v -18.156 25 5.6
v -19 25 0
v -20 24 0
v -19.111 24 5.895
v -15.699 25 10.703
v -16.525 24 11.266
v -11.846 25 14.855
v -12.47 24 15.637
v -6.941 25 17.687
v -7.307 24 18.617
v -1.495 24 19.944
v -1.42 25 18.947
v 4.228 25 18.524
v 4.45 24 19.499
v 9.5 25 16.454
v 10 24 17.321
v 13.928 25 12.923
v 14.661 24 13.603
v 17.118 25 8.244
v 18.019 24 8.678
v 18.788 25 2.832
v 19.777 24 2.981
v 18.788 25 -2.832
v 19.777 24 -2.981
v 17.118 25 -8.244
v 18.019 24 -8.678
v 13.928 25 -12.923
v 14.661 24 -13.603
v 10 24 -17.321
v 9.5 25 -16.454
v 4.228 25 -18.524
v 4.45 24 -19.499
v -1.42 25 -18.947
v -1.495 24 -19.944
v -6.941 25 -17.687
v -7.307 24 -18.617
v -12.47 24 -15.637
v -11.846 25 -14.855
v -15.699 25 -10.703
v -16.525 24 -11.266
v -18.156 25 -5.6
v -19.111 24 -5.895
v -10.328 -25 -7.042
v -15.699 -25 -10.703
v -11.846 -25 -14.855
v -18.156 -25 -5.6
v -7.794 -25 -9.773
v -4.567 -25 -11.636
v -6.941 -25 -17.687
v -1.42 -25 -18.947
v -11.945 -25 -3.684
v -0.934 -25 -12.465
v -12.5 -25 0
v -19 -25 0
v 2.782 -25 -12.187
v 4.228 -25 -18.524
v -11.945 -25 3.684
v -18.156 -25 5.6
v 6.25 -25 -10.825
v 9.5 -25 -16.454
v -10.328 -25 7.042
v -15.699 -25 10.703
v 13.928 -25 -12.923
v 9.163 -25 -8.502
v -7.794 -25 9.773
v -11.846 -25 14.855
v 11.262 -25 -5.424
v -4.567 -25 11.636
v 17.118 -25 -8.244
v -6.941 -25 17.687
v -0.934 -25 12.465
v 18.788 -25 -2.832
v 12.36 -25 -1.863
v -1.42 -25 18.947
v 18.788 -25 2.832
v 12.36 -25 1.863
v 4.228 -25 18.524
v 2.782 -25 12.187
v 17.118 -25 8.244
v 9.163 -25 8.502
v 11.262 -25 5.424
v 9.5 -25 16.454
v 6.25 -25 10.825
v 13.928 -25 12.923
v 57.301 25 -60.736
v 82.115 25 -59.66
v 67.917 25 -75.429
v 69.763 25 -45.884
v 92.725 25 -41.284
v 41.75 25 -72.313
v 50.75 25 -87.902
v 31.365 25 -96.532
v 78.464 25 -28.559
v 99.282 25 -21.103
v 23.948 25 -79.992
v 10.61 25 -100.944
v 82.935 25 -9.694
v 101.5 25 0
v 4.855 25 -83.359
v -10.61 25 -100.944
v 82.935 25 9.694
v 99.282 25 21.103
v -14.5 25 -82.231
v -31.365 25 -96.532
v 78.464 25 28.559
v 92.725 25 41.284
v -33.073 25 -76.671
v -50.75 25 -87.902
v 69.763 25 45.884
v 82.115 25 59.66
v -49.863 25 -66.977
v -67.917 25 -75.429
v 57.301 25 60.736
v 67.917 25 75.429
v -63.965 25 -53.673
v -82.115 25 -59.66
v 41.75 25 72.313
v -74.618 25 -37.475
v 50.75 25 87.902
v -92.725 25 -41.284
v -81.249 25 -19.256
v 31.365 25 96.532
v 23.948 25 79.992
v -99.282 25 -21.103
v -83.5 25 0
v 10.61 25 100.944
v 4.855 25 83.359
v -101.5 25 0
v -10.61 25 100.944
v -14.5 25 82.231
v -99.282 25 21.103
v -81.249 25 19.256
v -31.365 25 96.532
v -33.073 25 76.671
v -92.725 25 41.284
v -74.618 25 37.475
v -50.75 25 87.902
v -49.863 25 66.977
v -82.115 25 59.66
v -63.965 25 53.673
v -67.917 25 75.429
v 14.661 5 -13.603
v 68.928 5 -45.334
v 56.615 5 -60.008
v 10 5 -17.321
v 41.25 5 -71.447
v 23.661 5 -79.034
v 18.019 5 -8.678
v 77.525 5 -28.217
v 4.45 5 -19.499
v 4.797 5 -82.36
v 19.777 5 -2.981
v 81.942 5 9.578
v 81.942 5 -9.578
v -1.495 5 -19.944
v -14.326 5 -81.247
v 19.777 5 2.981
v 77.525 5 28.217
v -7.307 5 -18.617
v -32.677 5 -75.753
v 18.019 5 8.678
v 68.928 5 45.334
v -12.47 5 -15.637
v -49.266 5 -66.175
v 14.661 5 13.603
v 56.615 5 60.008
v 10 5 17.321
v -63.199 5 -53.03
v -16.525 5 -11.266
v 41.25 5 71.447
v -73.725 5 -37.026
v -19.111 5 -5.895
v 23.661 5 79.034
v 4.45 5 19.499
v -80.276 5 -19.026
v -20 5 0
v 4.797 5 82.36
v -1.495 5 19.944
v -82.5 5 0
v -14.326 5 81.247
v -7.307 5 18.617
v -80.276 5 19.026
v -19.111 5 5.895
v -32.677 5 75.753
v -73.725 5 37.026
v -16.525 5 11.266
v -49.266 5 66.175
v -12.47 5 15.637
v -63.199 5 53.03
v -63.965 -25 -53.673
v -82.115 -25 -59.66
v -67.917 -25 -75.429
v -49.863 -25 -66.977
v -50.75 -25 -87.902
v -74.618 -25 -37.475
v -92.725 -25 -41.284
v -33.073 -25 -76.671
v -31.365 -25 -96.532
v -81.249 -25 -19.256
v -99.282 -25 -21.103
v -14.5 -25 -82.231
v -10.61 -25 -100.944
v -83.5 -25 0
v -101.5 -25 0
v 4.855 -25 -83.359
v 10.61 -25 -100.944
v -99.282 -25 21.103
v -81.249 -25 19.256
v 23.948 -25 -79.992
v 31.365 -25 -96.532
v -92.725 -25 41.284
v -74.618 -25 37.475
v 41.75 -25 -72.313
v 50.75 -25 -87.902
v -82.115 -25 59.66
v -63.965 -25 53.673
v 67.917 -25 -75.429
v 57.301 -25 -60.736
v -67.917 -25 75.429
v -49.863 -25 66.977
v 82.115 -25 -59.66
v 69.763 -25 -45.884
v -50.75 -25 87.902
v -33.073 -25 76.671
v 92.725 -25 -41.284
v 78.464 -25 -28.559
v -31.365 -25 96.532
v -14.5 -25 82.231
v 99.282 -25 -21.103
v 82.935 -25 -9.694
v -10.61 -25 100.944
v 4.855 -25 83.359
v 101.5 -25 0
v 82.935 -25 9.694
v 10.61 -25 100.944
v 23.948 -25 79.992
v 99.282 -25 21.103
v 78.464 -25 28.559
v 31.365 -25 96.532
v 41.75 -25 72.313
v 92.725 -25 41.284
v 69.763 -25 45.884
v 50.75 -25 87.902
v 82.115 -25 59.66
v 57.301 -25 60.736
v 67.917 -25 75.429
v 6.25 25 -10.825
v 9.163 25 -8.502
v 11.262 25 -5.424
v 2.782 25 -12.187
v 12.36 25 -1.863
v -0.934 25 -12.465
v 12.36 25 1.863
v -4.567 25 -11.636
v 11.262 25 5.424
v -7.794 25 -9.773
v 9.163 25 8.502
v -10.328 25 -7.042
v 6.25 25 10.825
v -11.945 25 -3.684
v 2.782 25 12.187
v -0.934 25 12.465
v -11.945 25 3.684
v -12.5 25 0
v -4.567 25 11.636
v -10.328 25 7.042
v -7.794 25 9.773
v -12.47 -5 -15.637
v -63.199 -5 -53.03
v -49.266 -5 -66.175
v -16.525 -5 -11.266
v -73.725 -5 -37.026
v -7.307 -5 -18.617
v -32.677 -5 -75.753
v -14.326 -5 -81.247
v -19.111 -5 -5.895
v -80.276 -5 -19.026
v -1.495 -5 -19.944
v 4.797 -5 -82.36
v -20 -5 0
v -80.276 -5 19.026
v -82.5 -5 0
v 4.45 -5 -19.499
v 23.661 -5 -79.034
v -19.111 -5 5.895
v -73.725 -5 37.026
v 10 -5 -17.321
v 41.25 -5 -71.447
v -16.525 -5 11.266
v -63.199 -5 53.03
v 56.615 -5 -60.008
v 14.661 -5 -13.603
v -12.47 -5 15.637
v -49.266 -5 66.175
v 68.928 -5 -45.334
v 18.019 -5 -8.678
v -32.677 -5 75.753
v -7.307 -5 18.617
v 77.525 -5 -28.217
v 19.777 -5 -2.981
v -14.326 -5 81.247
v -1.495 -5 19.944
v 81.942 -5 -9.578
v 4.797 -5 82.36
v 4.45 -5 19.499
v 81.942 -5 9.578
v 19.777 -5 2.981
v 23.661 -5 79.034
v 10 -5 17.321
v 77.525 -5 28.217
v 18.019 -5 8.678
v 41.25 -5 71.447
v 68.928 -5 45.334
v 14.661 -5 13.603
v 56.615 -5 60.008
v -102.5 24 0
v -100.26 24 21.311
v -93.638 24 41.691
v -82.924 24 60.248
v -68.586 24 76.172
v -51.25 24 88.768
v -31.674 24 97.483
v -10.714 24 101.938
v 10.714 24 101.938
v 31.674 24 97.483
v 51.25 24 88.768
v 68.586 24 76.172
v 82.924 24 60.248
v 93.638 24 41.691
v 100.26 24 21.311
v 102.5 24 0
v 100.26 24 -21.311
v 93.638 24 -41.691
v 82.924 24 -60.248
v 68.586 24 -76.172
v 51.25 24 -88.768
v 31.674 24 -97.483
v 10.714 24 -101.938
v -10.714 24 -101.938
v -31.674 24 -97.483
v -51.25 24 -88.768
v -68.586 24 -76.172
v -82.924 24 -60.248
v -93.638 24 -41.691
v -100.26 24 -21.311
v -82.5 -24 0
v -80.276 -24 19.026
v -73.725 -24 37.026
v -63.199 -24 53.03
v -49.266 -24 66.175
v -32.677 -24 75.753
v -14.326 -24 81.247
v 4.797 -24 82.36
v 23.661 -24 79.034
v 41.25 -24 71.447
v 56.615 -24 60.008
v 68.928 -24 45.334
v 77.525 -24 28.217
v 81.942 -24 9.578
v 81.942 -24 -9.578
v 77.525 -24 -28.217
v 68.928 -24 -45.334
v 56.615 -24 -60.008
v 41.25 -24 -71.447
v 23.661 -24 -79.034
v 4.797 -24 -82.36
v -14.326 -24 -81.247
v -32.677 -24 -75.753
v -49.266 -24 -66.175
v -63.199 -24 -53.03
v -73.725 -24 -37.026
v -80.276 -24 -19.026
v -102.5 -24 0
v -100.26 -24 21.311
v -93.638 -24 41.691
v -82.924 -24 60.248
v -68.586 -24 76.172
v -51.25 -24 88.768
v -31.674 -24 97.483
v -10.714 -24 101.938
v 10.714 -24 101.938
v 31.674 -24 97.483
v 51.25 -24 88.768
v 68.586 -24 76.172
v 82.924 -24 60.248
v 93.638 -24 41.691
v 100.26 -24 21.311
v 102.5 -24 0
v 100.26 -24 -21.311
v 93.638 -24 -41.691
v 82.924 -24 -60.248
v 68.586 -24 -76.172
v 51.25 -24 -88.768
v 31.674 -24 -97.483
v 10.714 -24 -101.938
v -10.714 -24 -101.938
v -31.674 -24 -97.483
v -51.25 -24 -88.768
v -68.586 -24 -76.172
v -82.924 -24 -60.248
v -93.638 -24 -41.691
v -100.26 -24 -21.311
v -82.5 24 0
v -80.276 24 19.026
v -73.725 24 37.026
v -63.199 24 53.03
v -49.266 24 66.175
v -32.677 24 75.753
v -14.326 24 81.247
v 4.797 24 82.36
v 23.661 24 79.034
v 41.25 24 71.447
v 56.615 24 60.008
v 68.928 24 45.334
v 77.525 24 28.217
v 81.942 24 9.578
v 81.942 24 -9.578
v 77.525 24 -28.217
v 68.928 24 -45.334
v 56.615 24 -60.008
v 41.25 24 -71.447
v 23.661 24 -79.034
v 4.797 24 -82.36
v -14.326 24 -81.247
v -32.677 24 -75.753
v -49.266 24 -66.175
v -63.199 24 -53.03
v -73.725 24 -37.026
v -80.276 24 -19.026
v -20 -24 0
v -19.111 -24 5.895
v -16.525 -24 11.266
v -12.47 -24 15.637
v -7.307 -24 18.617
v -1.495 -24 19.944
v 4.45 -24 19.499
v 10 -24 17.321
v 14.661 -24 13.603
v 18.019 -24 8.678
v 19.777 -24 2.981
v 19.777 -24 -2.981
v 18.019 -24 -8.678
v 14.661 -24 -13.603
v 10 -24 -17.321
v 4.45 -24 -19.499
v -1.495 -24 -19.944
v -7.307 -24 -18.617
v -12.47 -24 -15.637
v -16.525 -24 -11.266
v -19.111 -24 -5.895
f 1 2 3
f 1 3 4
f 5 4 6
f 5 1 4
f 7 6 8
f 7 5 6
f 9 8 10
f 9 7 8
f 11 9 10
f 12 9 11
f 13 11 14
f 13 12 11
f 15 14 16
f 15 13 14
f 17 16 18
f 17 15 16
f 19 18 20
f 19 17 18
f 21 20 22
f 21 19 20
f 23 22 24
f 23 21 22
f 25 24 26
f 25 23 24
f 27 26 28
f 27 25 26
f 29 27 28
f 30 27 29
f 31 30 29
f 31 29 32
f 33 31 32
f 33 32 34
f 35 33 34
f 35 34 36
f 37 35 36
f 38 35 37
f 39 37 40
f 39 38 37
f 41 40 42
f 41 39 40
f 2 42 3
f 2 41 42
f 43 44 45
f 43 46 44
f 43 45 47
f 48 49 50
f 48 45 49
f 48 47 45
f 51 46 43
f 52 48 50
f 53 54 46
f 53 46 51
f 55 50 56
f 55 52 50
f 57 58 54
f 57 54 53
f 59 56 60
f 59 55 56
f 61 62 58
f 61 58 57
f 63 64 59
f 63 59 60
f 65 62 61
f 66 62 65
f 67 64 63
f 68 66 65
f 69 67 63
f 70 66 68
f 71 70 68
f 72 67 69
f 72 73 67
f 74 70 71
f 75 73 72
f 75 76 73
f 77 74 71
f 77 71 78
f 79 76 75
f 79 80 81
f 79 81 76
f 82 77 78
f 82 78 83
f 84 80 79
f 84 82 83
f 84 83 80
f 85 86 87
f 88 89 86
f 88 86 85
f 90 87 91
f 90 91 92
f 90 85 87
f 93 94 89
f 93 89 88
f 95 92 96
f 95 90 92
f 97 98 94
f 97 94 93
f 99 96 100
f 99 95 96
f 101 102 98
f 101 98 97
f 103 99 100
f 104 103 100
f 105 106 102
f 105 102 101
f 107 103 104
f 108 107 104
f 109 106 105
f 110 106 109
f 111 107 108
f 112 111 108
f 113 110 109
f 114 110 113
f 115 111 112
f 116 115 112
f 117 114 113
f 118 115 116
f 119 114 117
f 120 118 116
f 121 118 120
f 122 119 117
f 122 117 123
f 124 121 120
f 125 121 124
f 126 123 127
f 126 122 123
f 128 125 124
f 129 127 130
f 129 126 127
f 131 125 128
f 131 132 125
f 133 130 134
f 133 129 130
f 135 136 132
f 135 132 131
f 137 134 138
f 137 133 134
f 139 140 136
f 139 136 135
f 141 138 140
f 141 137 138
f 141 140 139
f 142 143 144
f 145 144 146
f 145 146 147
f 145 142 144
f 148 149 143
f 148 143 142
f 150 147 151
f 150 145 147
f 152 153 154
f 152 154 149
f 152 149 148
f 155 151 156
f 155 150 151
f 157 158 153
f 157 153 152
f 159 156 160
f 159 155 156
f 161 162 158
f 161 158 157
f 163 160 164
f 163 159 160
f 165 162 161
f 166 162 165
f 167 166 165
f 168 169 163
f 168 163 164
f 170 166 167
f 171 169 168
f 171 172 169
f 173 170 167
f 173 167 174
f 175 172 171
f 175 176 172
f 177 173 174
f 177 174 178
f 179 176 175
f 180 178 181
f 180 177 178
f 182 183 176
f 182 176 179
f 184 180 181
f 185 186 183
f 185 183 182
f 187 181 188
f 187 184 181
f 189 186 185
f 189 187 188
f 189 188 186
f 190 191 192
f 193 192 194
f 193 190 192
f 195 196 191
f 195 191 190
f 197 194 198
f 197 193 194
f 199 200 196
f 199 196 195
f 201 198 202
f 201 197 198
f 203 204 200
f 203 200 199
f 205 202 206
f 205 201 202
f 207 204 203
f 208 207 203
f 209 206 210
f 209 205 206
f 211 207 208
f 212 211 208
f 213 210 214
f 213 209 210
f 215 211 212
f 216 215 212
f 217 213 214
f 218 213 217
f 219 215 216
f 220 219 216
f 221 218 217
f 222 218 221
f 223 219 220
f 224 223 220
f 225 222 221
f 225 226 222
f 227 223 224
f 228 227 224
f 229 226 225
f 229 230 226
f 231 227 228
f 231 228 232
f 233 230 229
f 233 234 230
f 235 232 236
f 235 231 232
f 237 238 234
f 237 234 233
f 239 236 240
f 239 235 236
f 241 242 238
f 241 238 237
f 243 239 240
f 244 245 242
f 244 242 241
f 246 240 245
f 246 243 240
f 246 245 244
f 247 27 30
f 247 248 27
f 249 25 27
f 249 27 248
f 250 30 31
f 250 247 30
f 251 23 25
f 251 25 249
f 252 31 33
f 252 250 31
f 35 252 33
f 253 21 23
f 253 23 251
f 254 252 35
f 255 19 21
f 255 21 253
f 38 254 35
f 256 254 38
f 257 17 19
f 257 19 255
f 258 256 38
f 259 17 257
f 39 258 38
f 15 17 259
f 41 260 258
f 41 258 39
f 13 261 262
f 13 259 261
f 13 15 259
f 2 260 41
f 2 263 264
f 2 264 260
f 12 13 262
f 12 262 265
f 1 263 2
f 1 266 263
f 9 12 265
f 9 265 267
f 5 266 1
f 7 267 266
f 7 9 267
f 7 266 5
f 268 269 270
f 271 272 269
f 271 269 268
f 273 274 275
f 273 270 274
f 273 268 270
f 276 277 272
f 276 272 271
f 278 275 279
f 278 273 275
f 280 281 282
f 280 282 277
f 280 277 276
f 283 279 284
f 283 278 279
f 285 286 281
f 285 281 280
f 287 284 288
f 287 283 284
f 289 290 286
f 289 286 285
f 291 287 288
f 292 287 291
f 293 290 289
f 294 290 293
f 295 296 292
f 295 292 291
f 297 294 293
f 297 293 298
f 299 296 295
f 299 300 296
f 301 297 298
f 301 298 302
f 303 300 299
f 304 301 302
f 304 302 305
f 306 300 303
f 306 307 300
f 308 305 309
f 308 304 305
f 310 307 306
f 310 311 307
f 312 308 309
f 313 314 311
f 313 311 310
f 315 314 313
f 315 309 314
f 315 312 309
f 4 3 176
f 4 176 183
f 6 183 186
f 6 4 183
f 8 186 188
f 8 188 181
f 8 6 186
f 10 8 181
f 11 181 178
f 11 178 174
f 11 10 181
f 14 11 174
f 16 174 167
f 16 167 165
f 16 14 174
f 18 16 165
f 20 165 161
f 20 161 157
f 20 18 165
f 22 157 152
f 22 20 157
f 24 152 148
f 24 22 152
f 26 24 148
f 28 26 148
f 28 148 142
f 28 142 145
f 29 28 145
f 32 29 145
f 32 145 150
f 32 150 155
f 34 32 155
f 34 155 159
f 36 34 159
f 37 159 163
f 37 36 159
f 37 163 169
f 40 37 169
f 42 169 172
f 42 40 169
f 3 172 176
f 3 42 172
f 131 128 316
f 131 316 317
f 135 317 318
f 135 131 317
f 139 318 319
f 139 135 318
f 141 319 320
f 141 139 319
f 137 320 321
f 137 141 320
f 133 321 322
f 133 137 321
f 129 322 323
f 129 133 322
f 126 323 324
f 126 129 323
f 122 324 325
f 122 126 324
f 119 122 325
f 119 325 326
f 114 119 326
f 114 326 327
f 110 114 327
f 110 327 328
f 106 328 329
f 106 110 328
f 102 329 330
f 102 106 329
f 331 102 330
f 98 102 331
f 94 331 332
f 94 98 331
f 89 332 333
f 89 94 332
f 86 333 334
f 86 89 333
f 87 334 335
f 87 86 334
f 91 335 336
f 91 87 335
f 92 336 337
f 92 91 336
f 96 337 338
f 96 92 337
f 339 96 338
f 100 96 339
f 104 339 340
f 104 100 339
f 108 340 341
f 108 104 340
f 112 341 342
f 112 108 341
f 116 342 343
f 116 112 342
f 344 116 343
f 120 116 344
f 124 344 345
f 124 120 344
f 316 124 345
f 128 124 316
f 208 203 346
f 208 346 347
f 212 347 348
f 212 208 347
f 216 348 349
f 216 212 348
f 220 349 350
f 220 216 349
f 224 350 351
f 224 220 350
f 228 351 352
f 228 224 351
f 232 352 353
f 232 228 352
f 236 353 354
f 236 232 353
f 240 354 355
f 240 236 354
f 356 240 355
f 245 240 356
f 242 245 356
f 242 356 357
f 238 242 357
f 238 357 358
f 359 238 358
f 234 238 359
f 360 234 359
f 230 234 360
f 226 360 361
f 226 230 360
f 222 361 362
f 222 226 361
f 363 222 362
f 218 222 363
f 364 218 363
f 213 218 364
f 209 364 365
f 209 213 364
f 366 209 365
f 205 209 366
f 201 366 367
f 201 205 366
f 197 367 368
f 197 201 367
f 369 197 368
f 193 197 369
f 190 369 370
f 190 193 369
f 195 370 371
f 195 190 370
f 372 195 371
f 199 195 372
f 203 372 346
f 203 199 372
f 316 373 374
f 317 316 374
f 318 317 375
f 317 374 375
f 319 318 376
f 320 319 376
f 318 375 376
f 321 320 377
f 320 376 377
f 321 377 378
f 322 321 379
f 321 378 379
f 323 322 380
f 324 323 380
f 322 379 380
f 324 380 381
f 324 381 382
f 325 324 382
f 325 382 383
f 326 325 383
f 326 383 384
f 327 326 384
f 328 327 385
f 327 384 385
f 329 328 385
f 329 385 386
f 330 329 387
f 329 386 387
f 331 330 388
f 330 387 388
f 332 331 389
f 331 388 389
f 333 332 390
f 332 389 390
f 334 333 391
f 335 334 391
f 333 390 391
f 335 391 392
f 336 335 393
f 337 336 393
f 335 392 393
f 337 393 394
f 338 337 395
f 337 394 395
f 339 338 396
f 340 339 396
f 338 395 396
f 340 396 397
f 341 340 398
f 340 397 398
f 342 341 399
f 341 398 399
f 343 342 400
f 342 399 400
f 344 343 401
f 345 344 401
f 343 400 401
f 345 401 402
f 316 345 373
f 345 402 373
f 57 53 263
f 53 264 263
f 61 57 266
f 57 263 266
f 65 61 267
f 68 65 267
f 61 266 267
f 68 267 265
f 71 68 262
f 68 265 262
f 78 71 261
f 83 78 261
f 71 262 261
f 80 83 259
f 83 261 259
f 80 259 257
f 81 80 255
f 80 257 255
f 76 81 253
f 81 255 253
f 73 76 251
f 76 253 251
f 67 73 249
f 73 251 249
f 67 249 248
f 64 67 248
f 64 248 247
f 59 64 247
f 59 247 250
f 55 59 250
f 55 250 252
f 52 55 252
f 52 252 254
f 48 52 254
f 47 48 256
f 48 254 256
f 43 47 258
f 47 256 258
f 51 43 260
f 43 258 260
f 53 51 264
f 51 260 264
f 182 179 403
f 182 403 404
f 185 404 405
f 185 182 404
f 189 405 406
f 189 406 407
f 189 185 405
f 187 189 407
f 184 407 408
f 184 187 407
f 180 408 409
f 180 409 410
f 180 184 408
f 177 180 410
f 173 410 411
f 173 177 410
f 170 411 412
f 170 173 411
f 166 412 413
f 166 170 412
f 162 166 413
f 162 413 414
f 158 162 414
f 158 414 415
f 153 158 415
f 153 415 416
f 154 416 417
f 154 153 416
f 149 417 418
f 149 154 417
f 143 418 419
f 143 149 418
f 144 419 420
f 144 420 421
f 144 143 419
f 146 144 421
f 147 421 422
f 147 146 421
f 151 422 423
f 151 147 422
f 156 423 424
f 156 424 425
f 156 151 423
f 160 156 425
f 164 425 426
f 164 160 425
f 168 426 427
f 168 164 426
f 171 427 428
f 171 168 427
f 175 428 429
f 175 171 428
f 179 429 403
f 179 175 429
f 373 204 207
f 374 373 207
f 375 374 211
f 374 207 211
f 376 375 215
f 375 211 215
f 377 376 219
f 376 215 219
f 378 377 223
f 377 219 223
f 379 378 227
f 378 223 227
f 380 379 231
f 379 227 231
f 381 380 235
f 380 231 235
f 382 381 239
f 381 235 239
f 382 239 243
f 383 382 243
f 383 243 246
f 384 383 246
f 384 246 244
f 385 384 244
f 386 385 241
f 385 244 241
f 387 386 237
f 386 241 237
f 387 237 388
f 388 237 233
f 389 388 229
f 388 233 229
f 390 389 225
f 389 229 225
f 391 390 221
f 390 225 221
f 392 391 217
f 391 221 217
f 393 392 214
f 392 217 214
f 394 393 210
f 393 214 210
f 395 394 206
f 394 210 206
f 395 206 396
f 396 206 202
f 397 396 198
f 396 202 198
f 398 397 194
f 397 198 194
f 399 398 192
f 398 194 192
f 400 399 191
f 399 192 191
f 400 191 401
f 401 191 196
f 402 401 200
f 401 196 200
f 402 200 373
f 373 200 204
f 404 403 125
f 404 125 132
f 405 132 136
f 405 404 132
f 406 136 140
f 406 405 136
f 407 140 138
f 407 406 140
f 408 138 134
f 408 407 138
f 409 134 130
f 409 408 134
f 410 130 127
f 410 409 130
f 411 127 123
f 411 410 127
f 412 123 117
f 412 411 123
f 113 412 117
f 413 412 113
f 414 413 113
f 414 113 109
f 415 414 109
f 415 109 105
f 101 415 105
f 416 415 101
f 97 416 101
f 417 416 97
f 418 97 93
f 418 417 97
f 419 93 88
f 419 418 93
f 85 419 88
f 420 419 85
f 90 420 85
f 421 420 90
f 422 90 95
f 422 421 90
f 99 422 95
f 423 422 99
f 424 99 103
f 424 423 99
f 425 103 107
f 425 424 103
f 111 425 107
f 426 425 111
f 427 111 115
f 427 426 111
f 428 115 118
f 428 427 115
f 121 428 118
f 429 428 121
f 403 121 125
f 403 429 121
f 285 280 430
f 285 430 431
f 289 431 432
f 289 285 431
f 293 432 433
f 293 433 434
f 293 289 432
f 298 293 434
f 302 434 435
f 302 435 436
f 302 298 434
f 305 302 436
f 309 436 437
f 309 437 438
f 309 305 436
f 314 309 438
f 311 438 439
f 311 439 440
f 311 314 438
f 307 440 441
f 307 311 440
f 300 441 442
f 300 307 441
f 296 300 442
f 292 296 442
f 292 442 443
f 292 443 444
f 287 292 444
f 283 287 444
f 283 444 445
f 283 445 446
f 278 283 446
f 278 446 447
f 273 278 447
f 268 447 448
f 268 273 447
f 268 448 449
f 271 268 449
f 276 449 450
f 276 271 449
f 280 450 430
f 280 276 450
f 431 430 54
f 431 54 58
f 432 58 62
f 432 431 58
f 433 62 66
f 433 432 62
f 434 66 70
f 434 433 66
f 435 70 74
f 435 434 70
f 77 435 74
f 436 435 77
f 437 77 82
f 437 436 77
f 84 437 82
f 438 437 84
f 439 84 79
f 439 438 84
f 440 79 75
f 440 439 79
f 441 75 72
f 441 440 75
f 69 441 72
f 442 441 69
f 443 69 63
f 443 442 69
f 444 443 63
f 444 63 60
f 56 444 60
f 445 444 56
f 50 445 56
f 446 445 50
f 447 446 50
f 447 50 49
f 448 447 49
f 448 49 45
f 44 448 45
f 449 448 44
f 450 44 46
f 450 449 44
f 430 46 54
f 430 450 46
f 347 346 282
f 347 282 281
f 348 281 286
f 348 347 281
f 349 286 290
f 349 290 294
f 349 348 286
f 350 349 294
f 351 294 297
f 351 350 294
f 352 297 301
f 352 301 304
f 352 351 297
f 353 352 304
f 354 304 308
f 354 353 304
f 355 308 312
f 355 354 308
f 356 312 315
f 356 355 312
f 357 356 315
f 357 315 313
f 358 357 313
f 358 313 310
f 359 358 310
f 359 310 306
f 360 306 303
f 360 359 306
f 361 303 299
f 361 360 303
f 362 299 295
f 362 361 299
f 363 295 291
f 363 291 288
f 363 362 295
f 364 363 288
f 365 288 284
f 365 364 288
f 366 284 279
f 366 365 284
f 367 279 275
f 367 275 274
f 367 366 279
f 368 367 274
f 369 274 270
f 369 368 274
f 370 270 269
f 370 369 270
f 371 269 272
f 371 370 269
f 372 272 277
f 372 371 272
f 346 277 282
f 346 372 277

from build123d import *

# Parameters (mm, degrees)
CHAMFER_SIZE = 1


with BuildPart() as part:
    # Sketch → Revolution (revolve)
    with BuildSketch(Plane.XY):
        Polygon((-102.5, 0), (-102.5, 25), (-82.5, 25), (-82.5, 5), (-20, 5), (-20, 25), (-12.5, 25), (-12.5, 0), (-12.5, -25), (-20, -25), (-20, -5), (-82.5, -5), (-82.5, -25), (-102.5, -25), align=None)
    revolve(axis=Axis((0, 0, 0), (0, 1, 0)))

    # Chamfer
    chamfer_edges = [part.edges().sort_by_distance(p)[0] for p in [
        (82.5, 25, 0),
        (102.5, -25, 0),
        (102.5, 25, 0),
        (20, 25, 0),
        (82.5, -25, 0),
        (20, -25, 0),
    ]]
    chamfer(chamfer_edges, length=CHAMFER_SIZE)


solid = part.part
